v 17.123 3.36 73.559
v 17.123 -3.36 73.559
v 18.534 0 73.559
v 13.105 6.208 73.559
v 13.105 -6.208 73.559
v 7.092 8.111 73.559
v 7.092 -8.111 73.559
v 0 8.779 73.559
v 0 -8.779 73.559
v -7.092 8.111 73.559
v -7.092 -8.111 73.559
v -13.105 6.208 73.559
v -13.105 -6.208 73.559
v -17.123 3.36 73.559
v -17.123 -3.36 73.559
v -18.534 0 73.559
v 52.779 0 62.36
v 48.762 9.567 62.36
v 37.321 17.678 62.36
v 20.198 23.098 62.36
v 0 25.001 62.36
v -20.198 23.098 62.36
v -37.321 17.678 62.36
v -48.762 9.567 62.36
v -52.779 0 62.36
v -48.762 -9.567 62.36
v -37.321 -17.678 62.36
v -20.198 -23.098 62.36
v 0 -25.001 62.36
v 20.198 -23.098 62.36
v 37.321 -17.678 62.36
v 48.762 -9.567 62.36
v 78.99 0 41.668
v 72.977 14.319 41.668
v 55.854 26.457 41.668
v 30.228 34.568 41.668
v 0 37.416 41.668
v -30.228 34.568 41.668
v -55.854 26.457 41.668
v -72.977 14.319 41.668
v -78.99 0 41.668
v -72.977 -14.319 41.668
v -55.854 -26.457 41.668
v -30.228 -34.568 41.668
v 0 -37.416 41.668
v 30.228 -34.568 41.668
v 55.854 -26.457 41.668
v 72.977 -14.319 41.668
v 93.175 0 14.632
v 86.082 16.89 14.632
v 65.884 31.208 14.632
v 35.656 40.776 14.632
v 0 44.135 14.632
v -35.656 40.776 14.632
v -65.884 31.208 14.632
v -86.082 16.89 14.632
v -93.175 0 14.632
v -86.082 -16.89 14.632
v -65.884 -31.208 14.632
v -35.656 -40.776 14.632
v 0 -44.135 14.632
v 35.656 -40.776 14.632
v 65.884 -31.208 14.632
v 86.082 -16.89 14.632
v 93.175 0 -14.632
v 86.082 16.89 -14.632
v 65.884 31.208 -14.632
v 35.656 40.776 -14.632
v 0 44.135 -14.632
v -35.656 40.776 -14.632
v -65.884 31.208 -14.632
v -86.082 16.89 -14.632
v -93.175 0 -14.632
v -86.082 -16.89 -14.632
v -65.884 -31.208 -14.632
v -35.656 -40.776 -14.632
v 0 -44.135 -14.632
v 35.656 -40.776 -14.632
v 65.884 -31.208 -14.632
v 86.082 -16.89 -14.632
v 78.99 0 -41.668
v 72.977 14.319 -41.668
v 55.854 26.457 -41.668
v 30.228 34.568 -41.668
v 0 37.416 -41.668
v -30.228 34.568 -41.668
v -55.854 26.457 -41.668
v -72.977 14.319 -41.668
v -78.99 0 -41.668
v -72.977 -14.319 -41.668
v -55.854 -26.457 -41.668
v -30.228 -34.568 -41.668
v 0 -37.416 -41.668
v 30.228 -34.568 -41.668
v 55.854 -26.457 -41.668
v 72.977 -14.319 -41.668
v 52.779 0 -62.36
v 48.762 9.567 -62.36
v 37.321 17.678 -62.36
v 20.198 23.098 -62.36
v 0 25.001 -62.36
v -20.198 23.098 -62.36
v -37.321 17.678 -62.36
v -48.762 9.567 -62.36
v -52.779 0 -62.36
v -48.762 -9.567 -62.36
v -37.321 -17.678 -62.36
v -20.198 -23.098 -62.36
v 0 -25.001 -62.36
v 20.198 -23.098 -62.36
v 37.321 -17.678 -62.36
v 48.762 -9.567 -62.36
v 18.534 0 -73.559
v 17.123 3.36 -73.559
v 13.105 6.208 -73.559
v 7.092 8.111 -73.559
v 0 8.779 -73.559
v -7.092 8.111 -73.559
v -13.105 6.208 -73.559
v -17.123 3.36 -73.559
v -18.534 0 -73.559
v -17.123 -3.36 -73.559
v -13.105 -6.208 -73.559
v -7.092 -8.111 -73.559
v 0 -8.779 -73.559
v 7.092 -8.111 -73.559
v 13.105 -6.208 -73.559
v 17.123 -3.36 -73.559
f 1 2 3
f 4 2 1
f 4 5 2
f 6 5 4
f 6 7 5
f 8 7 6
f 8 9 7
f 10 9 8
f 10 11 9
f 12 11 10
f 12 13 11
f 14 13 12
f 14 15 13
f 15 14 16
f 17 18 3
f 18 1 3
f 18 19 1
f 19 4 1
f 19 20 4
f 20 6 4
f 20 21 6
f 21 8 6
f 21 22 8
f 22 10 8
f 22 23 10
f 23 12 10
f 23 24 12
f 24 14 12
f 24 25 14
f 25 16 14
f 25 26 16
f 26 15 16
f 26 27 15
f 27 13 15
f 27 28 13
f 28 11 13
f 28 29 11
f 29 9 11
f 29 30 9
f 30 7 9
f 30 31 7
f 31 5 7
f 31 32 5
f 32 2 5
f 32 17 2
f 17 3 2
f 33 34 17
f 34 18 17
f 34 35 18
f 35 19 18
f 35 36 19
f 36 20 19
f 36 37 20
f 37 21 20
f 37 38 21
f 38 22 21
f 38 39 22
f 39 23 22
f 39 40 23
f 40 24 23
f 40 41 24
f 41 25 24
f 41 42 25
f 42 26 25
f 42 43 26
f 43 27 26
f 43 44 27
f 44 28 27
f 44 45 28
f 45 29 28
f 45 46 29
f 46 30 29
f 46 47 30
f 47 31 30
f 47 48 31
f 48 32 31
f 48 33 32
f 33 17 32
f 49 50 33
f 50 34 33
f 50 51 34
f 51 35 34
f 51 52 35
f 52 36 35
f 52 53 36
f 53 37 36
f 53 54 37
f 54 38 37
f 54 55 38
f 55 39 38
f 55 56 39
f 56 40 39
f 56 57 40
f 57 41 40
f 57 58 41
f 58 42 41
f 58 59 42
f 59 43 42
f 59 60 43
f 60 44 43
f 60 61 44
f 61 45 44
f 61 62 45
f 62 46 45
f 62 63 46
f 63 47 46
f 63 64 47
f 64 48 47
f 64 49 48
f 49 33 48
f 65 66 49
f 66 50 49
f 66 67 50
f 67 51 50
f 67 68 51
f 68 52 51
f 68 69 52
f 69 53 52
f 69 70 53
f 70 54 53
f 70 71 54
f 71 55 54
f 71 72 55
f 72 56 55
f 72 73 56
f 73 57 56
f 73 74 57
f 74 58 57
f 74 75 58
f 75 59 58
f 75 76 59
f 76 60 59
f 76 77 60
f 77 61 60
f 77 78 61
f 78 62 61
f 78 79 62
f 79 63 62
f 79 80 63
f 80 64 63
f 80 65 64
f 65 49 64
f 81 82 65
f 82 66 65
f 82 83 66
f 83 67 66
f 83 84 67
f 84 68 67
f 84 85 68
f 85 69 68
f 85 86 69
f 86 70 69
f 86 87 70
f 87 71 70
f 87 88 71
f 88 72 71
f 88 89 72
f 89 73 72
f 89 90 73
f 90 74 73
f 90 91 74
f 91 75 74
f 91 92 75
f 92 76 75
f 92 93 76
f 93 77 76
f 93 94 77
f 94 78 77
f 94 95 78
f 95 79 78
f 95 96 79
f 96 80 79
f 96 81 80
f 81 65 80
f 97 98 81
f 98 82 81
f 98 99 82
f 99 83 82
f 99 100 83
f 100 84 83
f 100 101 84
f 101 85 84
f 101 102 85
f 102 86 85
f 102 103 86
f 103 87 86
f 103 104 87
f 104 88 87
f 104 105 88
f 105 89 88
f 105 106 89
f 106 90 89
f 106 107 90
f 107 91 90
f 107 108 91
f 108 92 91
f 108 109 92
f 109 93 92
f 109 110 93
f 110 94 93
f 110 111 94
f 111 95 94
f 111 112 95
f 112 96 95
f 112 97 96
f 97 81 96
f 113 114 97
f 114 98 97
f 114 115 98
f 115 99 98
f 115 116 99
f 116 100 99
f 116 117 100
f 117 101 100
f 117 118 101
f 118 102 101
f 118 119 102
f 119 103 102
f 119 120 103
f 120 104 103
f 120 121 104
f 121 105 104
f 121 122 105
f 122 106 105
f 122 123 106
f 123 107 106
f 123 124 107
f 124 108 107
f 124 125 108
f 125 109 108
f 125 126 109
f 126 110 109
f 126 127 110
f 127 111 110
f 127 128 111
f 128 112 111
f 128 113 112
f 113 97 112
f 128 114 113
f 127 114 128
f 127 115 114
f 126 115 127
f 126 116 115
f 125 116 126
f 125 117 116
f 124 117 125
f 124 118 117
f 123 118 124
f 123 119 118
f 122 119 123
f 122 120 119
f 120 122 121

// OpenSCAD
// Generated by SolidPython 1.0.1 on 2020-07-29 00:46:54


scale(v = [19, 9, 15]) {
	sphere(r = 5);
}
/***********************************************
*********      SolidPython code:      **********
************************************************
 
# import packages: SolidPython
from solid import *
from solid.utils import *
from itertools import chain, combinations, permutations


class Resize:

    def __init__(self, scad_file):
        self.scad_file = scad_file
        #self.scad_file = import_scad(scad_file)
        # cone/cylinder param:
        self.r1 = 0
        self.r2 = 0
        self.h = 0
        # rectangular prism param:
        self.w = 0
        self.l = 0
        # ellipse param:
        self.r = 0

    # import OpenScad code (file name corresponds to shape)


    # classify shape + parameters
    def assign(self, param1, param2, param3):
        if self.scad_file == 'cone.scad':
            self.r1 = param1
            self.r2 = param2
            self.h = param3
        elif self.scad_file == 'cylinder.scad':
            self.r1 = param1
            self.r2 = param2
            self.h = param3
        elif self.scad_file == 'rectangularPrism.scad':
            self.h = param1
            self.l = param2
            self.w = param3
        else:
            self.r = param1
            self.h = param2

    # resize parameters
    def iterate(self):
        x = range(3, 20, 2)
        i = 1
        if self.scad_file == 'cone.scad':
            tempList = list(permutations(x, 2))
            for temp in tempList:
                param1 = temp[0]
                param2 = temp[1]
                filepath = 'produced_scad_files/' + 'cone' + str(param1) + '_' + str(param2) + '_' + '.scad'
                scad_render_to_file(cylinder(h=param1, r1=param2, r2=0), filepath)

        elif self.scad_file == 'cylinder.scad':
            tempList = list(permutations(x, 3))
            for temp in tempList:
                param1 = temp[0]
                param2 = temp[1]
                filepath = 'produced_scad_files/' + 'cylinder' + str(param1) + '_' + str(param2) + '_' + '.scad'
                scad_render_to_file(cylinder(h=param1, r1=param2, r2=param2), filepath)

        elif self.scad_file == 'rectangularPrism.scad':
            tempList = list(permutations(x, 3))
            for temp in tempList:
                param1 = temp[0]
                param2 = temp[1]
                param3 = temp[2]
                filepath = 'produced_scad_files/' + 'rectangularPrism' + str(param1) + '_' + str(param2) + '_' + str(
                    param3) + '.scad'
                scad_render_to_file(cube(size=(param1, param2, param3)), filepath)

        elif self.scad_file == 'ellipse.scad':
            tempList = list(permutations(x, 4))
            for temp in tempList:
                param1 = temp[0]
                param2 = temp[1]
                param3 = temp[2]
                param4 = temp[3]
                filepath = 'produced_scad_files/' + 'ellipse' + str(param1) + '_' + str(param2) + '_' + str(param3) + '_' + str(param4) + '.scad'
                scad_render_to_file(scale([param1, param2, param3])(sphere(r=param4)), filepath)

    def render_to_scadfile(self):
        scad_render_to_file(scad, 'example.scad') 
 
************************************************/
